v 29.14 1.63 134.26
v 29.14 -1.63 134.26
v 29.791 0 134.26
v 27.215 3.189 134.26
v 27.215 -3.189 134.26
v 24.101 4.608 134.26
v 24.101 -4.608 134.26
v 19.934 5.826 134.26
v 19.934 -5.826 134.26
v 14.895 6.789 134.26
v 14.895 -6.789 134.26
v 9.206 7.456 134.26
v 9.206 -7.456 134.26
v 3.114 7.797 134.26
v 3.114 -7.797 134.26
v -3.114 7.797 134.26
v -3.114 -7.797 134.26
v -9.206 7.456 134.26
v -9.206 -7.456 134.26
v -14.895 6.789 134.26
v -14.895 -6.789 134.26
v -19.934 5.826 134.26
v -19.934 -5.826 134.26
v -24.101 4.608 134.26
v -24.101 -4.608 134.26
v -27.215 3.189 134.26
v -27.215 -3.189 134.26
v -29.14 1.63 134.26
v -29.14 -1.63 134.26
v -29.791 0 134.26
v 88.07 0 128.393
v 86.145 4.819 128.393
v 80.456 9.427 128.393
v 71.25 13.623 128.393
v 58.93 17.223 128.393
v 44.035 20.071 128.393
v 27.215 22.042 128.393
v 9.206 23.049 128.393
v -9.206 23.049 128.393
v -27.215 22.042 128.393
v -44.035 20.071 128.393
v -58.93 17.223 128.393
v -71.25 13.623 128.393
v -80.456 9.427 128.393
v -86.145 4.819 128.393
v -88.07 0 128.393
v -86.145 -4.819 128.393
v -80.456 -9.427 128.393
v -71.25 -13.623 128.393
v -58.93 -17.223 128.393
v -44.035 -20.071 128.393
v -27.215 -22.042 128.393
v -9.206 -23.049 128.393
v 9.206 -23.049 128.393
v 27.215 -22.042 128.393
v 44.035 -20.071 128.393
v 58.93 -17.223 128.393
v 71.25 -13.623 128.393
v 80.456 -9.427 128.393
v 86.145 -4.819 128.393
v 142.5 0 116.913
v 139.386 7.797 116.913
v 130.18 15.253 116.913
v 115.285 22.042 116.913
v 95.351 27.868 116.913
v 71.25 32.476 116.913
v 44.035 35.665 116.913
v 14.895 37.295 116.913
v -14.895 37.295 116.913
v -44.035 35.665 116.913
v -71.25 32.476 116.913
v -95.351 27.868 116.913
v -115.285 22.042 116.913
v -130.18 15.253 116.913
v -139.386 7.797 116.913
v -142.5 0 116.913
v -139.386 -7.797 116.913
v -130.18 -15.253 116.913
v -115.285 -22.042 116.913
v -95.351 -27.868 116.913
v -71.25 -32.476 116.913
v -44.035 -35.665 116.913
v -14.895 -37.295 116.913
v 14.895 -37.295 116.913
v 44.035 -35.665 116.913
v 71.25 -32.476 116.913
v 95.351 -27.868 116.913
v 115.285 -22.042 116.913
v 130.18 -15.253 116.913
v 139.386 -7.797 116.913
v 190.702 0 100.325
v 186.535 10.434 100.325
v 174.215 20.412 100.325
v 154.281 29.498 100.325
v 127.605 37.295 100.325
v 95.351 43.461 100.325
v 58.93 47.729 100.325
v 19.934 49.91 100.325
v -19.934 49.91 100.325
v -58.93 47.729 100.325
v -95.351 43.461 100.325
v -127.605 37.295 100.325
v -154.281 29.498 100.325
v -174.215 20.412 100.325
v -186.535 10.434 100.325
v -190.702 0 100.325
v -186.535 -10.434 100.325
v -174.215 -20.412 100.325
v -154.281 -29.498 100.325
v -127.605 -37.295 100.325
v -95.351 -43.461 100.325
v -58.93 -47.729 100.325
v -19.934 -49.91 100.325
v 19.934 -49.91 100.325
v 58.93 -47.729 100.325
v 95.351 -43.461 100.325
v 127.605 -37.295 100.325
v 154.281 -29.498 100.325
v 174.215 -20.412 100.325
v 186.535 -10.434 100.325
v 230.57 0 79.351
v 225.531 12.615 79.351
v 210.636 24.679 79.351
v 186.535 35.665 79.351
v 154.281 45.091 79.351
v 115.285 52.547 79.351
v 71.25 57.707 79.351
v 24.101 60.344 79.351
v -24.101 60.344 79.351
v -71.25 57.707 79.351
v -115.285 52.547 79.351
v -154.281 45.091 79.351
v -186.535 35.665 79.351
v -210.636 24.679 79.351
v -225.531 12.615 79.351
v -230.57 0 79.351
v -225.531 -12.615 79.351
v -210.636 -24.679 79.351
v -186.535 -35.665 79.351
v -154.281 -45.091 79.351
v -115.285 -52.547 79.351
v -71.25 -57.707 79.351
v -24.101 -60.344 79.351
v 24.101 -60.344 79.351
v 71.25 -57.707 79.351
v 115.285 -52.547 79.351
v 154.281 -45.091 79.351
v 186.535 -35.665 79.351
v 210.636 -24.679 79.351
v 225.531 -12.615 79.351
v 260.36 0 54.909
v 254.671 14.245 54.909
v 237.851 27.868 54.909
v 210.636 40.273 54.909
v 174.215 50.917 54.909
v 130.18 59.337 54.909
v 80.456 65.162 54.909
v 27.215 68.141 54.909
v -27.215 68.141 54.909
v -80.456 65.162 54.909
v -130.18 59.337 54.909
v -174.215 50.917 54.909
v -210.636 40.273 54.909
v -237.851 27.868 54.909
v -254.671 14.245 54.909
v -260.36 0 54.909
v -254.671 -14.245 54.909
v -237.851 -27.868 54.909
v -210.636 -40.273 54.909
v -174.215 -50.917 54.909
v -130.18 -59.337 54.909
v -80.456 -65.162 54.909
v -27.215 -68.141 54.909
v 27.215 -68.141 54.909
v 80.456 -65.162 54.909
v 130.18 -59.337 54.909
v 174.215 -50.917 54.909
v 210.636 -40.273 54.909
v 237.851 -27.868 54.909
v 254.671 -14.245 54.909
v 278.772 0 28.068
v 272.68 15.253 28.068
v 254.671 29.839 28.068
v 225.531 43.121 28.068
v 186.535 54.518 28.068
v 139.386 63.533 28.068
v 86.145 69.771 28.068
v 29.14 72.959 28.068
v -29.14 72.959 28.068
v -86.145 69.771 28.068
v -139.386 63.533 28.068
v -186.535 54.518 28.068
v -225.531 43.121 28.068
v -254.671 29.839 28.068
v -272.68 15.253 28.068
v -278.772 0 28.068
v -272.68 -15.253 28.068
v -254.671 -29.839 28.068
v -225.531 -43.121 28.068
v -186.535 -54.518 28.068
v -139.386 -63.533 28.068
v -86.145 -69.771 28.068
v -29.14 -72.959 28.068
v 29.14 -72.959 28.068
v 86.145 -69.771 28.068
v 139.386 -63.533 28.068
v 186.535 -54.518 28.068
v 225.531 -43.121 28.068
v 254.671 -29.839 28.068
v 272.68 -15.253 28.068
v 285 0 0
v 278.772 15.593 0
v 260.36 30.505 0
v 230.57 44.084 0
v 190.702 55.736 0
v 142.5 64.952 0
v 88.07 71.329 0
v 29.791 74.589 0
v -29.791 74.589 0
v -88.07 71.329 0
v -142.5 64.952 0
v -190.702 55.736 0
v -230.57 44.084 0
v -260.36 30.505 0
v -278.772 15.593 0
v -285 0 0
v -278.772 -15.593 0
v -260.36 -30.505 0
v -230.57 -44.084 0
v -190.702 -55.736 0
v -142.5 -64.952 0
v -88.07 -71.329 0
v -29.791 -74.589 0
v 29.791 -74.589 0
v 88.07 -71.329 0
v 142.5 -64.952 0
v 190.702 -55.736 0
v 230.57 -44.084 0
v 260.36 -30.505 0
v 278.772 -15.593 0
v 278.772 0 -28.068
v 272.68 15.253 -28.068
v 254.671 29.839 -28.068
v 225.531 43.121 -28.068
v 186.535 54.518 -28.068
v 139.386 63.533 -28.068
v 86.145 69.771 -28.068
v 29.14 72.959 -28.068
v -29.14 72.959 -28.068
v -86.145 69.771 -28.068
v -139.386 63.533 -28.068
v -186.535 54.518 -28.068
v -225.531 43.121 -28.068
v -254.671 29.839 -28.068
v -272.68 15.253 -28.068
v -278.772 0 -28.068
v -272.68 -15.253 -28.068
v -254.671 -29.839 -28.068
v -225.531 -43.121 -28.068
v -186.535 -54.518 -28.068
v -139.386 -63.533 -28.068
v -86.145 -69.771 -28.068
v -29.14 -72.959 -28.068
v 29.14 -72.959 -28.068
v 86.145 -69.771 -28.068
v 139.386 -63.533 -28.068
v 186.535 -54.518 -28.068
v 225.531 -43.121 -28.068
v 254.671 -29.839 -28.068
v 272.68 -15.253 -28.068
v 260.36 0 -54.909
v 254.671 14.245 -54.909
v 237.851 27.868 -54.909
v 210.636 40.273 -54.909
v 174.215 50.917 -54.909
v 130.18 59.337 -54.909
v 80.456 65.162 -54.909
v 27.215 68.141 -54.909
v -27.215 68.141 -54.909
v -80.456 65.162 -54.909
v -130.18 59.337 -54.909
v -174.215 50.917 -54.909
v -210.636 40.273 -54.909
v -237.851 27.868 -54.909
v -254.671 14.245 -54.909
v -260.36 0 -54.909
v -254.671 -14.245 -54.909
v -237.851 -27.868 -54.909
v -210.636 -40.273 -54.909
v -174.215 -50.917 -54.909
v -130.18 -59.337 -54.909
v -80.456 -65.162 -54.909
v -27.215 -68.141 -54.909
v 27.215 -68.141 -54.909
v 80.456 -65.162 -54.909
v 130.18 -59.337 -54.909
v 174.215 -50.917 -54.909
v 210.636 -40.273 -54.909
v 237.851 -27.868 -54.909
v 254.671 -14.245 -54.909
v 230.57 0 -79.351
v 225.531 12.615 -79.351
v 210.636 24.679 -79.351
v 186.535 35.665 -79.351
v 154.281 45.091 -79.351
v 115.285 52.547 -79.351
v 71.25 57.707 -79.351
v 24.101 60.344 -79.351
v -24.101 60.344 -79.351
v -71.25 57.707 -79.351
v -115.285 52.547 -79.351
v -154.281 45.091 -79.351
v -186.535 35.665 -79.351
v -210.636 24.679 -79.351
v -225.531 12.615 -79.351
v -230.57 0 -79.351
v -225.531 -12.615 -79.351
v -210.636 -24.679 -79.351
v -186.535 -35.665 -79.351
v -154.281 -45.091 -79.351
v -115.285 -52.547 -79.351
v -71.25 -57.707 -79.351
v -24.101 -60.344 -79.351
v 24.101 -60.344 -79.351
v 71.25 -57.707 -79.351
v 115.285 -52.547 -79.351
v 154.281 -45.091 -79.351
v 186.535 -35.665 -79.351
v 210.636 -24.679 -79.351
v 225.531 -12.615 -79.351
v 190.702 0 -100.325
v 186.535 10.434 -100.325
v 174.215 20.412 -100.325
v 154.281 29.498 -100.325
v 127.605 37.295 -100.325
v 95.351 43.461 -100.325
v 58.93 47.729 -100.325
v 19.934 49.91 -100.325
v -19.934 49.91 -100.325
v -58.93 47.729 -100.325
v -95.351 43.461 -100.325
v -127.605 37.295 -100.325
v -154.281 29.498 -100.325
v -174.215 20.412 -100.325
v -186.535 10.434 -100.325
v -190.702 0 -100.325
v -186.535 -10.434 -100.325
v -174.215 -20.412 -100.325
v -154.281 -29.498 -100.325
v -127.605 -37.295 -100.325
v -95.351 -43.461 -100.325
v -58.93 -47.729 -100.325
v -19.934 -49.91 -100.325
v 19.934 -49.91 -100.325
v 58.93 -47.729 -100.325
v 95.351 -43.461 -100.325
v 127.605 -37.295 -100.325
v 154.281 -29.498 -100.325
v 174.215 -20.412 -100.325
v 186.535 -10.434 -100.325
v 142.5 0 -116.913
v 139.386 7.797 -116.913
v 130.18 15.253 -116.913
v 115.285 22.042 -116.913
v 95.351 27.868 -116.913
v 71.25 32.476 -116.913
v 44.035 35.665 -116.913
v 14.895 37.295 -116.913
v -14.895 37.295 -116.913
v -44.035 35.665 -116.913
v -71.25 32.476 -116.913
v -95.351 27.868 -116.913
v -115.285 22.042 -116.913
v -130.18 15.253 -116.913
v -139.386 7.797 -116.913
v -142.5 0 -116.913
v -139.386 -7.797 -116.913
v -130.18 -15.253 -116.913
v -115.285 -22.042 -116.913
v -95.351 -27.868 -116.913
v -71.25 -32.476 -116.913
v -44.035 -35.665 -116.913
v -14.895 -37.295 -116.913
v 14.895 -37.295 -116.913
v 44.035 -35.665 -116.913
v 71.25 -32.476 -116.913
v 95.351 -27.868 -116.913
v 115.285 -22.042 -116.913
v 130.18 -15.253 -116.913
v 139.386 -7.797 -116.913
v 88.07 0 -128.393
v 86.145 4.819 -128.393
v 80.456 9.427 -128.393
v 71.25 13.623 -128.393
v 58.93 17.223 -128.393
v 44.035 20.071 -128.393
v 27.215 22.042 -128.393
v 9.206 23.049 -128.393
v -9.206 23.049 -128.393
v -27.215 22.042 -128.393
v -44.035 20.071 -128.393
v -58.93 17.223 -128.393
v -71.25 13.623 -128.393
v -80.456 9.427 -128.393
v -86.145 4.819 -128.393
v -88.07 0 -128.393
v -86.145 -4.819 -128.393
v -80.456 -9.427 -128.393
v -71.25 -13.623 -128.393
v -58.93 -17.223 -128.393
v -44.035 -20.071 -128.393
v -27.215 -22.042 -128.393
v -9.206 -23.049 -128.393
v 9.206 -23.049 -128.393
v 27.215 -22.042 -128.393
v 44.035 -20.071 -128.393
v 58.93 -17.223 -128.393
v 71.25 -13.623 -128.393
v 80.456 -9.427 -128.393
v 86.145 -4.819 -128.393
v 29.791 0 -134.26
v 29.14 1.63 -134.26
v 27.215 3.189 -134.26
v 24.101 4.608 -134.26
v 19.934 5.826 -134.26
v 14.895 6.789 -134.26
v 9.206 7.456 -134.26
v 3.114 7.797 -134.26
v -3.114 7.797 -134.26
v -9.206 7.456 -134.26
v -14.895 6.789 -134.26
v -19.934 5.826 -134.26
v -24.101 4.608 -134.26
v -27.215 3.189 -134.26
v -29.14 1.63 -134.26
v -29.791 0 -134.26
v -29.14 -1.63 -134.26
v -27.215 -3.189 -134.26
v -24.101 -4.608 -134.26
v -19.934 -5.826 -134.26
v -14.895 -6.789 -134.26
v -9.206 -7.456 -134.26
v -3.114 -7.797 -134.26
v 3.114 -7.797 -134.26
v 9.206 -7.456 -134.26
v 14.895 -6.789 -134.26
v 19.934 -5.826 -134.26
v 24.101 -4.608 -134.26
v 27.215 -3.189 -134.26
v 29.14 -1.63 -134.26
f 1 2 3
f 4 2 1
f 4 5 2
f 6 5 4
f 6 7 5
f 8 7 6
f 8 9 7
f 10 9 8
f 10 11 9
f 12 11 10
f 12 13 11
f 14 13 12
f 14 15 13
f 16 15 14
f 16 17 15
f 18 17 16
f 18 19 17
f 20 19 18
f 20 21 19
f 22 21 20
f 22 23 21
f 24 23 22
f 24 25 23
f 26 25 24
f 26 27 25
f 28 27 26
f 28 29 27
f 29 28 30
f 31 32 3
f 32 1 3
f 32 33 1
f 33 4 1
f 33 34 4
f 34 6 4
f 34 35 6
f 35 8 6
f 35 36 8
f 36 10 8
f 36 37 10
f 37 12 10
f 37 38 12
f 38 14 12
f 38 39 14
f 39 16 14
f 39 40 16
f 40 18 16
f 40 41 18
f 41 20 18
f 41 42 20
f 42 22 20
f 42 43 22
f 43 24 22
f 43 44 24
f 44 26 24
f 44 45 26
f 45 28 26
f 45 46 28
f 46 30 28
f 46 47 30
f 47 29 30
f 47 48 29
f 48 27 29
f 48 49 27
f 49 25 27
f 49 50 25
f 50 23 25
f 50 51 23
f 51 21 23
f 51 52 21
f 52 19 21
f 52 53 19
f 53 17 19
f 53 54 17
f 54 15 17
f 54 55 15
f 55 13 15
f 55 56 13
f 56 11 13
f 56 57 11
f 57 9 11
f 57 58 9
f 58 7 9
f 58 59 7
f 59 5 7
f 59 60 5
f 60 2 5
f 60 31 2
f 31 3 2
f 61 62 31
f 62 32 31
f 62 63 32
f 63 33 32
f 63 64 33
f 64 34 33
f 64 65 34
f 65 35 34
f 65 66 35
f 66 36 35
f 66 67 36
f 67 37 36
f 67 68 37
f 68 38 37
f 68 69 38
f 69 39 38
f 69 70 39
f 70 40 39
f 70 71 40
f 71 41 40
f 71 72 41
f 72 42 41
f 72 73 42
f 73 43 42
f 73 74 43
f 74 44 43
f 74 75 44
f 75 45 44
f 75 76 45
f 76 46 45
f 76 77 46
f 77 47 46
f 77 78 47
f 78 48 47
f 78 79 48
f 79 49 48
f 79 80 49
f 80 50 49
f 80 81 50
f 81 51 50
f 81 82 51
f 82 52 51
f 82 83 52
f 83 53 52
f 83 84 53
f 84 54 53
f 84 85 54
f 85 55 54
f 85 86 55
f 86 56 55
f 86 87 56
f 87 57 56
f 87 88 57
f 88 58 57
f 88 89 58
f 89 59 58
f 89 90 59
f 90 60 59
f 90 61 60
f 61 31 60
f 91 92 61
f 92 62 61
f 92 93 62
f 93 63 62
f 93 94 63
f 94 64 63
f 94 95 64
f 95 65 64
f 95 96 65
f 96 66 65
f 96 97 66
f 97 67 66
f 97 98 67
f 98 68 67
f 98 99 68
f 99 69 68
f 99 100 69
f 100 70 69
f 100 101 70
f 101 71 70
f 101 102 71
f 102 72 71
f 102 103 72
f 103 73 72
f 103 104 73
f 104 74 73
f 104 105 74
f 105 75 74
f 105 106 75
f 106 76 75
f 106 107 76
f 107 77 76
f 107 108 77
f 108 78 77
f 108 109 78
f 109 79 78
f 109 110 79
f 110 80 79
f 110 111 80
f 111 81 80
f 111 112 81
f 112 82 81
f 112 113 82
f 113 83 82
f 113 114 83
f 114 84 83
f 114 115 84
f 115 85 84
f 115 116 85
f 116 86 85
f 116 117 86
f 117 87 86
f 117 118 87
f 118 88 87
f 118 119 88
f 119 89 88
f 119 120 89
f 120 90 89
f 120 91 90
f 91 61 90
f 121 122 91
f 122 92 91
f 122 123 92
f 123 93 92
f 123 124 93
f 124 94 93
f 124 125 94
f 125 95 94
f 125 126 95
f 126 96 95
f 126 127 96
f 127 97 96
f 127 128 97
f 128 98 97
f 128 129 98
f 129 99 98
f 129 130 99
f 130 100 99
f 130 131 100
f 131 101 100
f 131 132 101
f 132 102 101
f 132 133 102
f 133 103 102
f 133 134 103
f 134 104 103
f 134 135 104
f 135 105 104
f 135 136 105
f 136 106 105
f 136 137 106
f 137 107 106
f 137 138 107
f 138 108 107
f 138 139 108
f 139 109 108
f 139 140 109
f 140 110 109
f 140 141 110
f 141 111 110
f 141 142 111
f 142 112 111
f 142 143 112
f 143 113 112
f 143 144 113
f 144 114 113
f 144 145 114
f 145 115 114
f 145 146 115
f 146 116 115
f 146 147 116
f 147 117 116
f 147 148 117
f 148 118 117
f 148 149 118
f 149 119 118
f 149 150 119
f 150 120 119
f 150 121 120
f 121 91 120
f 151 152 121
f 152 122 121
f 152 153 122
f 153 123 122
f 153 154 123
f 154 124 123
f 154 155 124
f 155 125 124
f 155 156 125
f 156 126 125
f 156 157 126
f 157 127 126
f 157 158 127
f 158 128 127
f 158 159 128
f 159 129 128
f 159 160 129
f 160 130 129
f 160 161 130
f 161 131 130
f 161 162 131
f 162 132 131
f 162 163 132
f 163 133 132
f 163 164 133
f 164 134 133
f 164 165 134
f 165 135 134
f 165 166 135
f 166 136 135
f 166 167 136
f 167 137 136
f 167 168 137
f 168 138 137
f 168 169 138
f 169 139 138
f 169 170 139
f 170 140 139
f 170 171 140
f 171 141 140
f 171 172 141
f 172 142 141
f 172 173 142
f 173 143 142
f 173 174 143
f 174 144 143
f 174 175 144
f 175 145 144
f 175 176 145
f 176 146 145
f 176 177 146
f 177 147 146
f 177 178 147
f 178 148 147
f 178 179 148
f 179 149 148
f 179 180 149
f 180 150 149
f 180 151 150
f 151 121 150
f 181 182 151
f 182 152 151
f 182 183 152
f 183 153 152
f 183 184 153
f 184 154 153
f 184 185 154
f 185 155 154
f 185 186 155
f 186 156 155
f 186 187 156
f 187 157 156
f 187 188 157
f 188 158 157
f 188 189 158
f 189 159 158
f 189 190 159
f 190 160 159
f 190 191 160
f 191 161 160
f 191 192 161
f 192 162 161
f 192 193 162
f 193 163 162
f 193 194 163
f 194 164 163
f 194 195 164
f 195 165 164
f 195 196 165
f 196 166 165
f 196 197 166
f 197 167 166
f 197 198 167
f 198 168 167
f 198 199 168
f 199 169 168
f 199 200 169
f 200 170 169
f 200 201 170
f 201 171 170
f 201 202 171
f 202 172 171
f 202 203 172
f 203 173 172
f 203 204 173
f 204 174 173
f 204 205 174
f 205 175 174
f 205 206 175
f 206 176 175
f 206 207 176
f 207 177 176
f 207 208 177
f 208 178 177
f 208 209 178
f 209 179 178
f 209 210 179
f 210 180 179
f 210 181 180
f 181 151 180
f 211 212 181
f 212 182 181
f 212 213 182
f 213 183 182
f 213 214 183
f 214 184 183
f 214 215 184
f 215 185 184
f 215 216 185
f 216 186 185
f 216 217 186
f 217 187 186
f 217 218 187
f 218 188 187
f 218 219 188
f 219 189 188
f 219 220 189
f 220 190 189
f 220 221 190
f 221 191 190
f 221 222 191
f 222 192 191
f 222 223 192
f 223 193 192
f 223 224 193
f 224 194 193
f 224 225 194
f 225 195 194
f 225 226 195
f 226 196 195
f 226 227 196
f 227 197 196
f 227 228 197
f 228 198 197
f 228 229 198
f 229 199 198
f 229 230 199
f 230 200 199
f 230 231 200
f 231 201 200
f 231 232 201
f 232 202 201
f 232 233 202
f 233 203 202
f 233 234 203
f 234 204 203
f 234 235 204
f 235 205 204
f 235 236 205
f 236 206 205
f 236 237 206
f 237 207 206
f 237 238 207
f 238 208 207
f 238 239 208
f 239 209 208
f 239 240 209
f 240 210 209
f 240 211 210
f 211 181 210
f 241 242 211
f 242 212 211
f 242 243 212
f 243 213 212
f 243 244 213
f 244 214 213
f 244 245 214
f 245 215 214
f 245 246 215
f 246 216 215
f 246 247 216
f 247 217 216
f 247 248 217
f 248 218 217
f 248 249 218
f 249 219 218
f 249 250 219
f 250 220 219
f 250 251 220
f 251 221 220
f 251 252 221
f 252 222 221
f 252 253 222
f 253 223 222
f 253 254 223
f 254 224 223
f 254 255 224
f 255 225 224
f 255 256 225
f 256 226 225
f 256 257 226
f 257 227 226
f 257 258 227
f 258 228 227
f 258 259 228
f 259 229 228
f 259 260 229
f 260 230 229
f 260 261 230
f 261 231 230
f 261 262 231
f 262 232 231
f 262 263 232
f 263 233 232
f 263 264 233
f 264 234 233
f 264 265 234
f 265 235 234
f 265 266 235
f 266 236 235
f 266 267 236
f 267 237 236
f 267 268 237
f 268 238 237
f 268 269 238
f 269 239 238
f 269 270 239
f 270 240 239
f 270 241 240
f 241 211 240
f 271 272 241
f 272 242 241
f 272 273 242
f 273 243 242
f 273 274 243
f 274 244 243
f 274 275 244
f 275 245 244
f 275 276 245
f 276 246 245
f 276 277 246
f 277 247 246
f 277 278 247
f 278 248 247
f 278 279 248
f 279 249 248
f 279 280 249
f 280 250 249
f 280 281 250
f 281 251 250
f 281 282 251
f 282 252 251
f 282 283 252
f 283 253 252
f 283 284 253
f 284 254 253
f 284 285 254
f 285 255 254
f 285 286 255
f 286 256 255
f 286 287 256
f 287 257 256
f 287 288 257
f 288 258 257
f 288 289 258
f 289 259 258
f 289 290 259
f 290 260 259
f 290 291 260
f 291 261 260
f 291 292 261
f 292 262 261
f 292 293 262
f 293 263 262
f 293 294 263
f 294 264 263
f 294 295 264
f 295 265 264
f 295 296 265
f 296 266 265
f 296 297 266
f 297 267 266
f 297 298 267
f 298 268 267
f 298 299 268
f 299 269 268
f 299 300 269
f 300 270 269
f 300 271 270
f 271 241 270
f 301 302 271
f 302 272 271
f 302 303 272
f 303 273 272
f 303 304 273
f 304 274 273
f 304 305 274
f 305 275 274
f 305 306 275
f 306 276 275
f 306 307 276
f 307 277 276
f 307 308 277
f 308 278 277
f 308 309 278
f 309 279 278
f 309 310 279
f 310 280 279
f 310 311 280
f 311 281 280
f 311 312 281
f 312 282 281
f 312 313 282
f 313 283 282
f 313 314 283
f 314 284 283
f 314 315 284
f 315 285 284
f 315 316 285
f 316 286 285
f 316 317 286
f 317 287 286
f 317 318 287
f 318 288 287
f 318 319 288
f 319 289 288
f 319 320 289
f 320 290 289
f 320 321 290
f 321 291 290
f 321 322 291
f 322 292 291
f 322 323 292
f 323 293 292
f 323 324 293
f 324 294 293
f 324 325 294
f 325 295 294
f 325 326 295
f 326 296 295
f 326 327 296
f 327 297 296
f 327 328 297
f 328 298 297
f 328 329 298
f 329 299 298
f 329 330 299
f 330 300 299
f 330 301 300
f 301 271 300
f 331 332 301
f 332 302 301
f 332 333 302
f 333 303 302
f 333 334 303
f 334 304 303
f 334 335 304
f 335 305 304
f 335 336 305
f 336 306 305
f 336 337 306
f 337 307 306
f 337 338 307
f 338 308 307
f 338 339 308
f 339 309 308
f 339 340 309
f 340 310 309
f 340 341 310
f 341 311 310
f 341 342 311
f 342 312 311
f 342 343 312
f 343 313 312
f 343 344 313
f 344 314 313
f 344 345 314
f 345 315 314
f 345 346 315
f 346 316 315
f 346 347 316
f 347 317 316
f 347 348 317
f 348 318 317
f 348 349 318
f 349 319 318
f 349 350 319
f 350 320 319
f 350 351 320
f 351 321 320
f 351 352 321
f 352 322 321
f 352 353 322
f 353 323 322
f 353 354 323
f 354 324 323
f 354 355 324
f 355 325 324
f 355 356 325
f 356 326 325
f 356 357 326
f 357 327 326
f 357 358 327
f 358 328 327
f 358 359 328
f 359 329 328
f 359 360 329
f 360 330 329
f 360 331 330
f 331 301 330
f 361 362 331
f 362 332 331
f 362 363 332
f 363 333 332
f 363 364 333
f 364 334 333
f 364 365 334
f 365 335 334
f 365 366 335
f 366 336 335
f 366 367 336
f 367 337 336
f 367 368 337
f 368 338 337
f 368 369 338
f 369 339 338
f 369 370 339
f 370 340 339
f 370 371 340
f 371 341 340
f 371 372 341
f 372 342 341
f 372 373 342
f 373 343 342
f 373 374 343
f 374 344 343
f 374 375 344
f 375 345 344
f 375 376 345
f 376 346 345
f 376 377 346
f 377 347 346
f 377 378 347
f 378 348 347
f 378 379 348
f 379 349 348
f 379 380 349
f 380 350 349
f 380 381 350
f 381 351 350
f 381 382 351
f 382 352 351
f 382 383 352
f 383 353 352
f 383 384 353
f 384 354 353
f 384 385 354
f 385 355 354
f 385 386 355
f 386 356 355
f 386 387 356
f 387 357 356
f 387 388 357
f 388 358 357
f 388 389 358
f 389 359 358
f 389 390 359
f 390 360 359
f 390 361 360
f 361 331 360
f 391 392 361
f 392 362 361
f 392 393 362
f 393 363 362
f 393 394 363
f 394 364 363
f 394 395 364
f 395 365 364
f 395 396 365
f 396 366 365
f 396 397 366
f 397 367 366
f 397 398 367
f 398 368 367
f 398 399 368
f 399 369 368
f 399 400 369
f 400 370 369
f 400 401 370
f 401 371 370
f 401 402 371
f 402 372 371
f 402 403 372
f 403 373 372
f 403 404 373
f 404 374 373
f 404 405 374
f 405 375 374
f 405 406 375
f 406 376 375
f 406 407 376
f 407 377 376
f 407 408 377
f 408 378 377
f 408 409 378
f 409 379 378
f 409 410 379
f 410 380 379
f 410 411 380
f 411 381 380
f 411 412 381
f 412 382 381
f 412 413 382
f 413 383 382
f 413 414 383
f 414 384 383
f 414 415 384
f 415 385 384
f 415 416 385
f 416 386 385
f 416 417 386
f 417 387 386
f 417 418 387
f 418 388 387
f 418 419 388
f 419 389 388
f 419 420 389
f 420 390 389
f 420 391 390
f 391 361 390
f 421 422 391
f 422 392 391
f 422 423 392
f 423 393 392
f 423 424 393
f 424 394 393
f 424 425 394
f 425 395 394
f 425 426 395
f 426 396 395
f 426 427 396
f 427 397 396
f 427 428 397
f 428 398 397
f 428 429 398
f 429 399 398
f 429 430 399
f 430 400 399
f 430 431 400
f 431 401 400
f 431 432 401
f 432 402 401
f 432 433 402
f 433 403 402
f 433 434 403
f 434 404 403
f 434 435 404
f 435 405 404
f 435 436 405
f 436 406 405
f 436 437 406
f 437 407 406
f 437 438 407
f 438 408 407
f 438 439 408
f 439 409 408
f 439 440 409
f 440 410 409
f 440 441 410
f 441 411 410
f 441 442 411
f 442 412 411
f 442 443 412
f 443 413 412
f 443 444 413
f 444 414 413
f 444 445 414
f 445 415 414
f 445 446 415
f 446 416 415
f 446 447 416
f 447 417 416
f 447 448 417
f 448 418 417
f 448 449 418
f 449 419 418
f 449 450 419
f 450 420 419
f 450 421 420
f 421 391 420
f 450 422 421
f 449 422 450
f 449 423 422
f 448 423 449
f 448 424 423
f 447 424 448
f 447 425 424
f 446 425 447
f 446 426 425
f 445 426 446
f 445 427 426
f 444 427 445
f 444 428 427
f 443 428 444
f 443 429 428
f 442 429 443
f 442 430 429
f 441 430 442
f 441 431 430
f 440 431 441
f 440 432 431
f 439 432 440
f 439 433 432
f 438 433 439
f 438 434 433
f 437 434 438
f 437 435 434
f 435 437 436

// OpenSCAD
// Generated by SolidPython 1.0.1 on 2020-07-29 00:46:53


scale(v = [19, 5, 9]) {
	sphere(r = 15);
}
/***********************************************
*********      SolidPython code:      **********
************************************************
 
# import packages: SolidPython
from solid import *
from solid.utils import *
from itertools import chain, combinations, permutations


class Resize:

    def __init__(self, scad_file):
        self.scad_file = scad_file
        #self.scad_file = import_scad(scad_file)
        # cone/cylinder param:
        self.r1 = 0
        self.r2 = 0
        self.h = 0
        # rectangular prism param:
        self.w = 0
        self.l = 0
        # ellipse param:
        self.r = 0

    # import OpenScad code (file name corresponds to shape)


    # classify shape + parameters
    def assign(self, param1, param2, param3):
        if self.scad_file == 'cone.scad':
            self.r1 = param1
            self.r2 = param2
            self.h = param3
        elif self.scad_file == 'cylinder.scad':
            self.r1 = param1
            self.r2 = param2
            self.h = param3
        elif self.scad_file == 'rectangularPrism.scad':
            self.h = param1
            self.l = param2
            self.w = param3
        else:
            self.r = param1
            self.h = param2

    # resize parameters
    def iterate(self):
        x = range(3, 20, 2)
        i = 1
        if self.scad_file == 'cone.scad':
            tempList = list(permutations(x, 2))
            for temp in tempList:
                param1 = temp[0]
                param2 = temp[1]
                filepath = 'produced_scad_files/' + 'cone' + str(param1) + '_' + str(param2) + '_' + '.scad'
                scad_render_to_file(cylinder(h=param1, r1=param2, r2=0), filepath)

        elif self.scad_file == 'cylinder.scad':
            tempList = list(permutations(x, 3))
            for temp in tempList:
                param1 = temp[0]
                param2 = temp[1]
                filepath = 'produced_scad_files/' + 'cylinder' + str(param1) + '_' + str(param2) + '_' + '.scad'
                scad_render_to_file(cylinder(h=param1, r1=param2, r2=param2), filepath)

        elif self.scad_file == 'rectangularPrism.scad':
            tempList = list(permutations(x, 3))
            for temp in tempList:
                param1 = temp[0]
                param2 = temp[1]
                param3 = temp[2]
                filepath = 'produced_scad_files/' + 'rectangularPrism' + str(param1) + '_' + str(param2) + '_' + str(
                    param3) + '.scad'
                scad_render_to_file(cube(size=(param1, param2, param3)), filepath)

        elif self.scad_file == 'ellipse.scad':
            tempList = list(permutations(x, 4))
            for temp in tempList:
                param1 = temp[0]
                param2 = temp[1]
                param3 = temp[2]
                param4 = temp[3]
                filepath = 'produced_scad_files/' + 'ellipse' + str(param1) + '_' + str(param2) + '_' + str(param3) + '_' + str(param4) + '.scad'
                scad_render_to_file(scale([param1, param2, param3])(sphere(r=param4)), filepath)

    def render_to_scadfile(self):
        scad_render_to_file(scad, 'example.scad') 
 
************************************************/
